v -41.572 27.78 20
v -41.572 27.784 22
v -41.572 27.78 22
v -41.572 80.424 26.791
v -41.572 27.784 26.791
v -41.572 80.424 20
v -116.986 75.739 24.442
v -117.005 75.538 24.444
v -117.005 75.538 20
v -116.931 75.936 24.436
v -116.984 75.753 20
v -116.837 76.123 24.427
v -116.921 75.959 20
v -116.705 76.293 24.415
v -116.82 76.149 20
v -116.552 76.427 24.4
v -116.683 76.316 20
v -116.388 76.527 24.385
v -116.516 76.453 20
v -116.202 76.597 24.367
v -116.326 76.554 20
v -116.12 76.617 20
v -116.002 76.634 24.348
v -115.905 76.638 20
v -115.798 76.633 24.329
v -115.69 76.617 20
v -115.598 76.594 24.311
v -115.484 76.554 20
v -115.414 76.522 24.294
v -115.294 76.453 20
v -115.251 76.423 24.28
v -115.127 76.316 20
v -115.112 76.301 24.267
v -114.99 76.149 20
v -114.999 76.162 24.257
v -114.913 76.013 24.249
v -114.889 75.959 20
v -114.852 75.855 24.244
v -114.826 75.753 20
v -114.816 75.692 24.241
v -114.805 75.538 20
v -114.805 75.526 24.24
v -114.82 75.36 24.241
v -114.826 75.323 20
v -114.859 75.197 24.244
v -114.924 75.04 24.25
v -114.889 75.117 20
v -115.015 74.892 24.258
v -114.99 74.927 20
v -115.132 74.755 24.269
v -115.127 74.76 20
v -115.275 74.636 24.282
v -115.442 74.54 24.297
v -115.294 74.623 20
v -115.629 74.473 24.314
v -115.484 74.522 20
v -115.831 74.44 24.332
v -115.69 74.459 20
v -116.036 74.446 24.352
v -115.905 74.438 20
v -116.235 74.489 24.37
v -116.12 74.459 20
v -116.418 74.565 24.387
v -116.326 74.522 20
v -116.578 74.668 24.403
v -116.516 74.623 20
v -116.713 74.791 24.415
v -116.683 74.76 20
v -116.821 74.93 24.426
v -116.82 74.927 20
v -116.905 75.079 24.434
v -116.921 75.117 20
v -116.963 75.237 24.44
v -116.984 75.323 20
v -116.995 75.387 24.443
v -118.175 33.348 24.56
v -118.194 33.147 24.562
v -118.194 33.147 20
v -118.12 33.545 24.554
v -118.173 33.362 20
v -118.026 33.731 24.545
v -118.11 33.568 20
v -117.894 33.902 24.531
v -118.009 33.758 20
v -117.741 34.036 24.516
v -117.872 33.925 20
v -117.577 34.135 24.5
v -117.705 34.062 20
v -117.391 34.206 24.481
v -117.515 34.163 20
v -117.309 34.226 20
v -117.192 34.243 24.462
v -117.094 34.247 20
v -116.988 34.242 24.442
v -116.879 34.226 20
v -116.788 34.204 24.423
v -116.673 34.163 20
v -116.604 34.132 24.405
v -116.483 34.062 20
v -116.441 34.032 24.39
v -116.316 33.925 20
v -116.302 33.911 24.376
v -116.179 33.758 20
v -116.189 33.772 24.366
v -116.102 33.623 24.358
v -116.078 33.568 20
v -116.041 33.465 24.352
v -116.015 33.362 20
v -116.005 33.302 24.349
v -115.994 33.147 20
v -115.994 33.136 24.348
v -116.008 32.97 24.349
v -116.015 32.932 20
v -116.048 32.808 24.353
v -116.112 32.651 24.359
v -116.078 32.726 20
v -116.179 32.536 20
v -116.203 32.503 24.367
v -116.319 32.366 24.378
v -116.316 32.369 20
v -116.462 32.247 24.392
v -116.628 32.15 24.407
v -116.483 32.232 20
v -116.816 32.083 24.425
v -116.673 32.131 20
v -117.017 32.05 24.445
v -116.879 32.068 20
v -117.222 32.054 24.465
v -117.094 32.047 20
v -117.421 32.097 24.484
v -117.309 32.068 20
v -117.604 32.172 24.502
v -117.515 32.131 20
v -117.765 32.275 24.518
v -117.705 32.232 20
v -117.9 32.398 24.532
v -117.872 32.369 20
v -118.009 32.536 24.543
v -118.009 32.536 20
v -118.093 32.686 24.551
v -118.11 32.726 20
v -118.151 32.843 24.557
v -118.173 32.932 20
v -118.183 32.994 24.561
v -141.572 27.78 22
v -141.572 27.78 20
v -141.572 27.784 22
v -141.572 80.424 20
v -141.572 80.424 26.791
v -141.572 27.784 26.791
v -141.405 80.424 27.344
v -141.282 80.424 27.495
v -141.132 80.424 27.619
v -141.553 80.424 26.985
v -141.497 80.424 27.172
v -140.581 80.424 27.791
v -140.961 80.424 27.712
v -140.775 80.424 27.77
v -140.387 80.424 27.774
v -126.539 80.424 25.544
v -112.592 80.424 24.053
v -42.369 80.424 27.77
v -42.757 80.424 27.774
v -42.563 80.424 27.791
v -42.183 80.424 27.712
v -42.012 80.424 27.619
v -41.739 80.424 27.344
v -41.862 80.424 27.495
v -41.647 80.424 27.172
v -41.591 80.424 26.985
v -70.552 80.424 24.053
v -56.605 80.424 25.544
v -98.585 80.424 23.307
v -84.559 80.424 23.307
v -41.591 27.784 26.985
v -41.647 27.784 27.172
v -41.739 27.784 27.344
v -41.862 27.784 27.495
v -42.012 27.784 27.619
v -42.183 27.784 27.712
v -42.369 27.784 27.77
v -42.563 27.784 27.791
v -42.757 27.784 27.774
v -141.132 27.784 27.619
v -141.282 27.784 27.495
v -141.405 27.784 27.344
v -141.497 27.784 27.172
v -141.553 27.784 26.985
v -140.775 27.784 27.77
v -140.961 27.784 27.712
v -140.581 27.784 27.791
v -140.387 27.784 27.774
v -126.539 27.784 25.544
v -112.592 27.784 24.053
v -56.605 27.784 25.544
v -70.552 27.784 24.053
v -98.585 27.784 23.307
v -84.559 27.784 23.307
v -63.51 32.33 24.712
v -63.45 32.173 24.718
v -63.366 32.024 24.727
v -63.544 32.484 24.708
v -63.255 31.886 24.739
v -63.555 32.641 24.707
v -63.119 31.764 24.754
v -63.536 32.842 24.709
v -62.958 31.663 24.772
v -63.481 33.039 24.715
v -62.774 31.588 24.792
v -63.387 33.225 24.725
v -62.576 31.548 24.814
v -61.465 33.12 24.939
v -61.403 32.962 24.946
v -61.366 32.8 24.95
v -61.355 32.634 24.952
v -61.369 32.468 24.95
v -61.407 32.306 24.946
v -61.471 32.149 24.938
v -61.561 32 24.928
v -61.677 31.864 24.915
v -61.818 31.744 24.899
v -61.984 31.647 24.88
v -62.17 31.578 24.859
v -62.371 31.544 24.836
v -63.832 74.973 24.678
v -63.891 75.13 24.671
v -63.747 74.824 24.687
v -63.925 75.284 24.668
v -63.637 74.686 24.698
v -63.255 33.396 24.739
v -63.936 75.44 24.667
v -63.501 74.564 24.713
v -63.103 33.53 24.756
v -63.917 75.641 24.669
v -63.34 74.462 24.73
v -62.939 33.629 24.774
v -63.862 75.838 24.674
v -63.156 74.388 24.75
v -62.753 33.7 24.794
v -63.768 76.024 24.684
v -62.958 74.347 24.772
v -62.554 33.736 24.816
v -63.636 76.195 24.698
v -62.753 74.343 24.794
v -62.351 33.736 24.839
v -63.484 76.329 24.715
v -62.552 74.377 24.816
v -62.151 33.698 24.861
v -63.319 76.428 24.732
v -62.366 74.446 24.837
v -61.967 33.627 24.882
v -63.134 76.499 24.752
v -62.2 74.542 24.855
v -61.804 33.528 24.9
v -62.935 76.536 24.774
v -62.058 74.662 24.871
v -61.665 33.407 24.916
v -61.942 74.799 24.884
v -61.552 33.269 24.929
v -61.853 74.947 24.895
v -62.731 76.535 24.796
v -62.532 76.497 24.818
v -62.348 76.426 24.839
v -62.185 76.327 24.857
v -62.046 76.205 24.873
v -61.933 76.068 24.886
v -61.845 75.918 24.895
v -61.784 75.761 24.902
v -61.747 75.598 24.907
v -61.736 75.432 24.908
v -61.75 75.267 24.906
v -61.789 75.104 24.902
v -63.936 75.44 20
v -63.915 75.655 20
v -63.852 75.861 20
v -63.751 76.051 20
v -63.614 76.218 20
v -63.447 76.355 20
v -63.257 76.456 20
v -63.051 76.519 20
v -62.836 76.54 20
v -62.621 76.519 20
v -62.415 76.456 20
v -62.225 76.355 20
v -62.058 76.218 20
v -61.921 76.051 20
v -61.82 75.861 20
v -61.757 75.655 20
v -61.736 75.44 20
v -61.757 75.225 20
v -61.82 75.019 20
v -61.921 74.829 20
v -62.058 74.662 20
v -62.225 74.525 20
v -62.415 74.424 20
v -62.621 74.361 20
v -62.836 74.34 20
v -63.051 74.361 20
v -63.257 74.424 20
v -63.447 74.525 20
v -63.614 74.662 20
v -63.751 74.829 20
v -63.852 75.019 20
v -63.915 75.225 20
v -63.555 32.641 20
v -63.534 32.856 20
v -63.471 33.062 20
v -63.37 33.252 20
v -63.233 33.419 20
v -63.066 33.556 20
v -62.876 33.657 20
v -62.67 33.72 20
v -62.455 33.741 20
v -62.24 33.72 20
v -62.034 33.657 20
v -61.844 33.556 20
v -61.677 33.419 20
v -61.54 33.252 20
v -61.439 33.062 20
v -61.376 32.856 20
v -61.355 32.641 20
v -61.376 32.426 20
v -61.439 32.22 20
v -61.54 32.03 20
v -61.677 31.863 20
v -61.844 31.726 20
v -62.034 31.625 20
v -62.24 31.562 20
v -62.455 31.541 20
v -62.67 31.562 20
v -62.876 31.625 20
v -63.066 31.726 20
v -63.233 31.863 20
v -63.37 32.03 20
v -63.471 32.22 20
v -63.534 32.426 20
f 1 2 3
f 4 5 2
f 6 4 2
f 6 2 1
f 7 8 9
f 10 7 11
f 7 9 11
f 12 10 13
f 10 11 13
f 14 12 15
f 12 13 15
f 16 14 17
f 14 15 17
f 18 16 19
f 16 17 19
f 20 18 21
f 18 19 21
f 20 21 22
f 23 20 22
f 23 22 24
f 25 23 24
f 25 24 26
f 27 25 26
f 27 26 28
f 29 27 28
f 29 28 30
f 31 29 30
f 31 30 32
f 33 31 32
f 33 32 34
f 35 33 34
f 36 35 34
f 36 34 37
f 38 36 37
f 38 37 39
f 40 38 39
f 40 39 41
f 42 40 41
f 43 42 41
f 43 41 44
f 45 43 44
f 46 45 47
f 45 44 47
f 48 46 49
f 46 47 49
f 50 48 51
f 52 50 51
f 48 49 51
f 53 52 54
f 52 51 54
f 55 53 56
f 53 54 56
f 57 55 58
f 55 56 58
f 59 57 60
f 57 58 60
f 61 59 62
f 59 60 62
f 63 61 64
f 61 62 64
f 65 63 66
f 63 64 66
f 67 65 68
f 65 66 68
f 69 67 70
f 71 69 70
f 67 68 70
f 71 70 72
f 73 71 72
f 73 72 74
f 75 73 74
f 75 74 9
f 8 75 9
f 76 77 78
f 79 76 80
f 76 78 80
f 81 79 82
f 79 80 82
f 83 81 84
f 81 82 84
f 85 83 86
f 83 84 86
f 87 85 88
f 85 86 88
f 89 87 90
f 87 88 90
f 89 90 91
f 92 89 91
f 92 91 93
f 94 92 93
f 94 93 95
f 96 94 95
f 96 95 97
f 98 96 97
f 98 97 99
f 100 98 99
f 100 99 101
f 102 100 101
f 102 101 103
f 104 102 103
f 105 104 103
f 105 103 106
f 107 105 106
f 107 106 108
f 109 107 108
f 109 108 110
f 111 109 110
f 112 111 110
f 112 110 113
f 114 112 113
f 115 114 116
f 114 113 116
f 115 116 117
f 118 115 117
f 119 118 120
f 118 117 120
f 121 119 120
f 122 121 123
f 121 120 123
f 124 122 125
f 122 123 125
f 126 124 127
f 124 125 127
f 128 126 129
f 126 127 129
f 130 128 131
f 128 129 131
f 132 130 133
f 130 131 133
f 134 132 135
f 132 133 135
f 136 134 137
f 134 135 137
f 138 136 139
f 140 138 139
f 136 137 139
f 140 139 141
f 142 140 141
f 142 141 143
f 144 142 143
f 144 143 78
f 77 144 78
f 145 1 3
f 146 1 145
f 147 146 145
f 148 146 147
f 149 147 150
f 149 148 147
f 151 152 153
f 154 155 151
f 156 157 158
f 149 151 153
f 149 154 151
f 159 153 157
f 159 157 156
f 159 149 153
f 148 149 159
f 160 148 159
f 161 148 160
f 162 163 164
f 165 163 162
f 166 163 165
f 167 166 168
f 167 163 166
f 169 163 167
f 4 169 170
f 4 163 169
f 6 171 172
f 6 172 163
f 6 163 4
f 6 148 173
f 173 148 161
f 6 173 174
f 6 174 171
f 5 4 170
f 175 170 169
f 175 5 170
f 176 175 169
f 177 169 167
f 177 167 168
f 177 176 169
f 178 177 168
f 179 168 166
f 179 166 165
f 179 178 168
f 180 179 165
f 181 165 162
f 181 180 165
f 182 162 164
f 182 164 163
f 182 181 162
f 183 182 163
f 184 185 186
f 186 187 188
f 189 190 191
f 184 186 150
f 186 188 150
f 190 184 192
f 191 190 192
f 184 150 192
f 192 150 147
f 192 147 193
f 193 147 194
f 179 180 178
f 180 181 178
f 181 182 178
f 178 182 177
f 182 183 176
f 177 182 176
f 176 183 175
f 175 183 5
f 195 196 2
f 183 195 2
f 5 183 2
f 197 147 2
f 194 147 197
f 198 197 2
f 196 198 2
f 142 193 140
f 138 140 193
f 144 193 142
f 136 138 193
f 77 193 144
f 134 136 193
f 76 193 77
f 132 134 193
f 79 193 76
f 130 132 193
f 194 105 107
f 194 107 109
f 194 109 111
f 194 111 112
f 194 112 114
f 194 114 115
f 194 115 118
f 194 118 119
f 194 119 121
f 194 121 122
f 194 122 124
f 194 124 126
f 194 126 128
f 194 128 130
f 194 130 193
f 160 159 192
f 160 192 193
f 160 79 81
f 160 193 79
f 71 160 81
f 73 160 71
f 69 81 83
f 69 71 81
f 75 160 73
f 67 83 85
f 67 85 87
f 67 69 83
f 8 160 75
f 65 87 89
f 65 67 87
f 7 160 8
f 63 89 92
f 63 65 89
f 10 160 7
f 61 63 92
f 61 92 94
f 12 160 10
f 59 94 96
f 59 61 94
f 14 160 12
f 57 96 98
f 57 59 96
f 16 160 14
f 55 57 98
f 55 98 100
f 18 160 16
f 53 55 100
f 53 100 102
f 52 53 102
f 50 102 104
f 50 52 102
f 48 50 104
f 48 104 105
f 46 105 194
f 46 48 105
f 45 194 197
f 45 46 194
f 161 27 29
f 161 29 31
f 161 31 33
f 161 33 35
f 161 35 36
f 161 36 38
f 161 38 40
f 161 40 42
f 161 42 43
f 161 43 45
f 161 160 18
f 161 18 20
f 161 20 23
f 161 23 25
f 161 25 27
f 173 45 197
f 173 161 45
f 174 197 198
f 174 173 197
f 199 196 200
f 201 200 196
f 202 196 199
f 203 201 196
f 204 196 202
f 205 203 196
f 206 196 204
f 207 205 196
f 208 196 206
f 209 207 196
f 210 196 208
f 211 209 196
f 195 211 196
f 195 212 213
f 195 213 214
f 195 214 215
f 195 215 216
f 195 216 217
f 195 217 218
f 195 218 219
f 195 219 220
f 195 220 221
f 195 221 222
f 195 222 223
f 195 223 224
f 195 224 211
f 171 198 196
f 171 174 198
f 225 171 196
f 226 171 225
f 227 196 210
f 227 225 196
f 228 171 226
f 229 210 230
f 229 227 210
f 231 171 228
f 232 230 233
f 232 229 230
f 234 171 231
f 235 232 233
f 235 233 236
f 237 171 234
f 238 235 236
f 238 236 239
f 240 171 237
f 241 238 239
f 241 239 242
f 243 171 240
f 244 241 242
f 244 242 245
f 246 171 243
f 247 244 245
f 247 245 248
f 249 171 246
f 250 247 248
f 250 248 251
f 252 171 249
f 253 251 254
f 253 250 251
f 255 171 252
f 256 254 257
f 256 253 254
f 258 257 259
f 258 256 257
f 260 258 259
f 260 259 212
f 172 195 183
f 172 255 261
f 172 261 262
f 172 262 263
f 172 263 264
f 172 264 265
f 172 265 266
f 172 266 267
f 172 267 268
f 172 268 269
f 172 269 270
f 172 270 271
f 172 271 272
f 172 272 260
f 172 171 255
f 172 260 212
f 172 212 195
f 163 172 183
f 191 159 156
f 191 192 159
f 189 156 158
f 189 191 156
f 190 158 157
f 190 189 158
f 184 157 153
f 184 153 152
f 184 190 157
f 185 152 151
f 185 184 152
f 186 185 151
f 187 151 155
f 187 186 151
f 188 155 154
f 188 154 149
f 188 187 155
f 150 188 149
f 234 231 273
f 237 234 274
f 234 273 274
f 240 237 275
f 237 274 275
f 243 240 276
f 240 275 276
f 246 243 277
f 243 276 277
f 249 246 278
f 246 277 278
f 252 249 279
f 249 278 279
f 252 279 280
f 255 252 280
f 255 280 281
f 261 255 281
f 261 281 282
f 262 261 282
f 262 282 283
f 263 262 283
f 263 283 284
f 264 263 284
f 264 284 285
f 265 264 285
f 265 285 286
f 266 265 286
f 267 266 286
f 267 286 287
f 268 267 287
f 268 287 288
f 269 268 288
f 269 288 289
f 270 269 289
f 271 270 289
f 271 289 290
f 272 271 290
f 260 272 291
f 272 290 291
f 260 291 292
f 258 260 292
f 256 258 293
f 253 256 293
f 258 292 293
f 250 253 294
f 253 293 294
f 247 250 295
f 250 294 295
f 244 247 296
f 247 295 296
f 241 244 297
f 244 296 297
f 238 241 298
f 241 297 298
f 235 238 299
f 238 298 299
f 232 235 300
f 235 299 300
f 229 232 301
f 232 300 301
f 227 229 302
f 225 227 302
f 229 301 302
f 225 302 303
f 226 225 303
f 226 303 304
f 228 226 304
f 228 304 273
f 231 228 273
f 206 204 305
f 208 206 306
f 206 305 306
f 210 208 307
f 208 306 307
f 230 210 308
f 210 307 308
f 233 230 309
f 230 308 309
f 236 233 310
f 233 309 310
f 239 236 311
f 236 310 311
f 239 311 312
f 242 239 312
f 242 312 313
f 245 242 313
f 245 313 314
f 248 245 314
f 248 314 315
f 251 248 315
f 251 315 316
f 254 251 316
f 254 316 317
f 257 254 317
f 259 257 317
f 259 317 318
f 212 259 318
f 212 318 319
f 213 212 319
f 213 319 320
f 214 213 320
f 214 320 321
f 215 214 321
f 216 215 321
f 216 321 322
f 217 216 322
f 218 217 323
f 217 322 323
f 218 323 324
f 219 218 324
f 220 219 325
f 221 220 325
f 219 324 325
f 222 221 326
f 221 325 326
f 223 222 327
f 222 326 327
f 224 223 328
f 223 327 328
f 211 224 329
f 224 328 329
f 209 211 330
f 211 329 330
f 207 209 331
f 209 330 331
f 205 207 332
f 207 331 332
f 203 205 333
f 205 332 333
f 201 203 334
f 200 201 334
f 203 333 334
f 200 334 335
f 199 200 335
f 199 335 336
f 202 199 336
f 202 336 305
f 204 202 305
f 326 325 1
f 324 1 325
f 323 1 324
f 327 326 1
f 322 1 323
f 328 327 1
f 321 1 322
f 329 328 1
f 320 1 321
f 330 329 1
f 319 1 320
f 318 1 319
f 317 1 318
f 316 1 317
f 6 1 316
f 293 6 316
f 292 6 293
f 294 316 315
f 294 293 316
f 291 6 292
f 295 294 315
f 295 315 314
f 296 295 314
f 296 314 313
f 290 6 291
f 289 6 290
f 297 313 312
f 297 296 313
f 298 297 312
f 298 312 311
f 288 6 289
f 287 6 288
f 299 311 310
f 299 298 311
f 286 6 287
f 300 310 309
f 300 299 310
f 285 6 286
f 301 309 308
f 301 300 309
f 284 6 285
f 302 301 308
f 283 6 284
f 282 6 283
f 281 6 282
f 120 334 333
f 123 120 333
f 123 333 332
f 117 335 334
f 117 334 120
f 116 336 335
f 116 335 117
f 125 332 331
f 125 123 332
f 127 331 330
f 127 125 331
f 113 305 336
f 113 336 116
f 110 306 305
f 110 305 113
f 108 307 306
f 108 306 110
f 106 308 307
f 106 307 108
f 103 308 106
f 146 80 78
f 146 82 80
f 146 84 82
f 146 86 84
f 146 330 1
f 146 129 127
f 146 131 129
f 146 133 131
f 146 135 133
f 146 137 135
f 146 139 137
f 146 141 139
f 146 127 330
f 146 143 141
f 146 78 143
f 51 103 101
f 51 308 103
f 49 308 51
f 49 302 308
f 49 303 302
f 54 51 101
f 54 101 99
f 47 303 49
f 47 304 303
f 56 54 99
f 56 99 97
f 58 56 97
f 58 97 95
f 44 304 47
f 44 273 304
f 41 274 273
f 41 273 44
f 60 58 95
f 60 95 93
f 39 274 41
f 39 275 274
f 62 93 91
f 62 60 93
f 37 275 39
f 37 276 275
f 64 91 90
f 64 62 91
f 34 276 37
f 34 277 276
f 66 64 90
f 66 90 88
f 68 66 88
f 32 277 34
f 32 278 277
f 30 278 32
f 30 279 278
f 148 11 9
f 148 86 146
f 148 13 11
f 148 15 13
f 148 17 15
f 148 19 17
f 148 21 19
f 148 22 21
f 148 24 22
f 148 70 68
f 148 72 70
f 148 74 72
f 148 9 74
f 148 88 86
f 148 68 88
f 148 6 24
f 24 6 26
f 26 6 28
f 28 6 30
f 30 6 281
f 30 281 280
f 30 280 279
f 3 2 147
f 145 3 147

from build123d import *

# Parameters (mm, degrees)
BOSS_EXTRUDE1_START = 20
BOSS_EXTRUDE1_DEPTH = 2
BOSS_EXTRUDE2_DEPTH = 52.64
SKETCH5_R           = 1.1
CUT_EXTRUDE2_DEPTH  = 19.64
SKETCH5_5_R         = 1.1
CUT_EXTRUDE3_DEPTH  = 19.64
SKETCH5_6_R         = 1.1
CUT_EXTRUDE4_DEPTH  = 19.64
SKETCH5_7_R         = 1.1
CUT_EXTRUDE5_DEPTH  = 19.64
FILLET1_R           = 1
FILLET2_R           = 1


with BuildPart() as part:
    # Sketch2 → Boss-Extrude1 (new body)
    with BuildSketch(Plane.XY.offset(BOSS_EXTRUDE1_START)):
        Polygon((-121.572, 80.424), (-41.572, 80.424), (-41.572, 27.78), (-141.572, 27.78), (-141.572, 80.424), align=None)
    extrude(amount=BOSS_EXTRUDE1_DEPTH)

    # Sketch3 → Boss-Extrude2 (add)
    with BuildSketch(Plane(origin=(0, 80.424, 0), x_dir=(1, 0, 0), z_dir=(0, 1, 0))):
        with BuildLine():
            Line((-41.572, -28), (-41.572, -22))
            Line((-41.572, -22), (-141.572, -22))
            Line((-141.572, -22), (-141.572, -28))
            ThreePointArc((-141.572, -28), (-91.572, -23.213616387), (-41.572, -28))
        make_face()
    extrude(amount=-BOSS_EXTRUDE2_DEPTH)

    # Sketch5 → Cut-Extrude2 (cut)
    with BuildSketch(Plane(origin=(0, 0, 20), x_dir=(-1, 0, 0), z_dir=(0, 0, -1))):
        with Locations((62.455, 32.641)):
            Circle(SKETCH5_R)
    extrude(amount=-CUT_EXTRUDE2_DEPTH, mode=Mode.SUBTRACT)

    # Sketch5<5> → Cut-Extrude3 (cut)
    with BuildSketch(Plane(origin=(0, 0, 20), x_dir=(-1, 0, 0), z_dir=(0, 0, -1))):
        with Locations((62.836, 75.44)):
            Circle(SKETCH5_5_R)
    extrude(amount=-CUT_EXTRUDE3_DEPTH, mode=Mode.SUBTRACT)

    # Sketch5<6> → Cut-Extrude4 (cut)
    with BuildSketch(Plane(origin=(0, 0, 20), x_dir=(-1, 0, 0), z_dir=(0, 0, -1))):
        with Locations((115.905, 75.538)):
            Circle(SKETCH5_6_R)
    extrude(amount=-CUT_EXTRUDE4_DEPTH, mode=Mode.SUBTRACT)

    # Sketch5<7> → Cut-Extrude5 (cut)
    with BuildSketch(Plane(origin=(0, 0, 20), x_dir=(-1, 0, 0), z_dir=(0, 0, -1))):
        with Locations((117.094, 33.147)):
            Circle(SKETCH5_7_R)
    extrude(amount=-CUT_EXTRUDE5_DEPTH, mode=Mode.SUBTRACT)

    # Fillet1
    fillet1_edges = [part.edges().sort_by_distance(p)[0] for p in [
        (-41.572, 54.104, 28),
    ]]
    fillet(fillet1_edges, radius=FILLET1_R)

    # Fillet2
    fillet2_edges = [part.edges().sort_by_distance(p)[0] for p in [
        (-141.572, 54.104, 28),
    ]]
    fillet(fillet2_edges, radius=FILLET2_R)


solid = part.part
